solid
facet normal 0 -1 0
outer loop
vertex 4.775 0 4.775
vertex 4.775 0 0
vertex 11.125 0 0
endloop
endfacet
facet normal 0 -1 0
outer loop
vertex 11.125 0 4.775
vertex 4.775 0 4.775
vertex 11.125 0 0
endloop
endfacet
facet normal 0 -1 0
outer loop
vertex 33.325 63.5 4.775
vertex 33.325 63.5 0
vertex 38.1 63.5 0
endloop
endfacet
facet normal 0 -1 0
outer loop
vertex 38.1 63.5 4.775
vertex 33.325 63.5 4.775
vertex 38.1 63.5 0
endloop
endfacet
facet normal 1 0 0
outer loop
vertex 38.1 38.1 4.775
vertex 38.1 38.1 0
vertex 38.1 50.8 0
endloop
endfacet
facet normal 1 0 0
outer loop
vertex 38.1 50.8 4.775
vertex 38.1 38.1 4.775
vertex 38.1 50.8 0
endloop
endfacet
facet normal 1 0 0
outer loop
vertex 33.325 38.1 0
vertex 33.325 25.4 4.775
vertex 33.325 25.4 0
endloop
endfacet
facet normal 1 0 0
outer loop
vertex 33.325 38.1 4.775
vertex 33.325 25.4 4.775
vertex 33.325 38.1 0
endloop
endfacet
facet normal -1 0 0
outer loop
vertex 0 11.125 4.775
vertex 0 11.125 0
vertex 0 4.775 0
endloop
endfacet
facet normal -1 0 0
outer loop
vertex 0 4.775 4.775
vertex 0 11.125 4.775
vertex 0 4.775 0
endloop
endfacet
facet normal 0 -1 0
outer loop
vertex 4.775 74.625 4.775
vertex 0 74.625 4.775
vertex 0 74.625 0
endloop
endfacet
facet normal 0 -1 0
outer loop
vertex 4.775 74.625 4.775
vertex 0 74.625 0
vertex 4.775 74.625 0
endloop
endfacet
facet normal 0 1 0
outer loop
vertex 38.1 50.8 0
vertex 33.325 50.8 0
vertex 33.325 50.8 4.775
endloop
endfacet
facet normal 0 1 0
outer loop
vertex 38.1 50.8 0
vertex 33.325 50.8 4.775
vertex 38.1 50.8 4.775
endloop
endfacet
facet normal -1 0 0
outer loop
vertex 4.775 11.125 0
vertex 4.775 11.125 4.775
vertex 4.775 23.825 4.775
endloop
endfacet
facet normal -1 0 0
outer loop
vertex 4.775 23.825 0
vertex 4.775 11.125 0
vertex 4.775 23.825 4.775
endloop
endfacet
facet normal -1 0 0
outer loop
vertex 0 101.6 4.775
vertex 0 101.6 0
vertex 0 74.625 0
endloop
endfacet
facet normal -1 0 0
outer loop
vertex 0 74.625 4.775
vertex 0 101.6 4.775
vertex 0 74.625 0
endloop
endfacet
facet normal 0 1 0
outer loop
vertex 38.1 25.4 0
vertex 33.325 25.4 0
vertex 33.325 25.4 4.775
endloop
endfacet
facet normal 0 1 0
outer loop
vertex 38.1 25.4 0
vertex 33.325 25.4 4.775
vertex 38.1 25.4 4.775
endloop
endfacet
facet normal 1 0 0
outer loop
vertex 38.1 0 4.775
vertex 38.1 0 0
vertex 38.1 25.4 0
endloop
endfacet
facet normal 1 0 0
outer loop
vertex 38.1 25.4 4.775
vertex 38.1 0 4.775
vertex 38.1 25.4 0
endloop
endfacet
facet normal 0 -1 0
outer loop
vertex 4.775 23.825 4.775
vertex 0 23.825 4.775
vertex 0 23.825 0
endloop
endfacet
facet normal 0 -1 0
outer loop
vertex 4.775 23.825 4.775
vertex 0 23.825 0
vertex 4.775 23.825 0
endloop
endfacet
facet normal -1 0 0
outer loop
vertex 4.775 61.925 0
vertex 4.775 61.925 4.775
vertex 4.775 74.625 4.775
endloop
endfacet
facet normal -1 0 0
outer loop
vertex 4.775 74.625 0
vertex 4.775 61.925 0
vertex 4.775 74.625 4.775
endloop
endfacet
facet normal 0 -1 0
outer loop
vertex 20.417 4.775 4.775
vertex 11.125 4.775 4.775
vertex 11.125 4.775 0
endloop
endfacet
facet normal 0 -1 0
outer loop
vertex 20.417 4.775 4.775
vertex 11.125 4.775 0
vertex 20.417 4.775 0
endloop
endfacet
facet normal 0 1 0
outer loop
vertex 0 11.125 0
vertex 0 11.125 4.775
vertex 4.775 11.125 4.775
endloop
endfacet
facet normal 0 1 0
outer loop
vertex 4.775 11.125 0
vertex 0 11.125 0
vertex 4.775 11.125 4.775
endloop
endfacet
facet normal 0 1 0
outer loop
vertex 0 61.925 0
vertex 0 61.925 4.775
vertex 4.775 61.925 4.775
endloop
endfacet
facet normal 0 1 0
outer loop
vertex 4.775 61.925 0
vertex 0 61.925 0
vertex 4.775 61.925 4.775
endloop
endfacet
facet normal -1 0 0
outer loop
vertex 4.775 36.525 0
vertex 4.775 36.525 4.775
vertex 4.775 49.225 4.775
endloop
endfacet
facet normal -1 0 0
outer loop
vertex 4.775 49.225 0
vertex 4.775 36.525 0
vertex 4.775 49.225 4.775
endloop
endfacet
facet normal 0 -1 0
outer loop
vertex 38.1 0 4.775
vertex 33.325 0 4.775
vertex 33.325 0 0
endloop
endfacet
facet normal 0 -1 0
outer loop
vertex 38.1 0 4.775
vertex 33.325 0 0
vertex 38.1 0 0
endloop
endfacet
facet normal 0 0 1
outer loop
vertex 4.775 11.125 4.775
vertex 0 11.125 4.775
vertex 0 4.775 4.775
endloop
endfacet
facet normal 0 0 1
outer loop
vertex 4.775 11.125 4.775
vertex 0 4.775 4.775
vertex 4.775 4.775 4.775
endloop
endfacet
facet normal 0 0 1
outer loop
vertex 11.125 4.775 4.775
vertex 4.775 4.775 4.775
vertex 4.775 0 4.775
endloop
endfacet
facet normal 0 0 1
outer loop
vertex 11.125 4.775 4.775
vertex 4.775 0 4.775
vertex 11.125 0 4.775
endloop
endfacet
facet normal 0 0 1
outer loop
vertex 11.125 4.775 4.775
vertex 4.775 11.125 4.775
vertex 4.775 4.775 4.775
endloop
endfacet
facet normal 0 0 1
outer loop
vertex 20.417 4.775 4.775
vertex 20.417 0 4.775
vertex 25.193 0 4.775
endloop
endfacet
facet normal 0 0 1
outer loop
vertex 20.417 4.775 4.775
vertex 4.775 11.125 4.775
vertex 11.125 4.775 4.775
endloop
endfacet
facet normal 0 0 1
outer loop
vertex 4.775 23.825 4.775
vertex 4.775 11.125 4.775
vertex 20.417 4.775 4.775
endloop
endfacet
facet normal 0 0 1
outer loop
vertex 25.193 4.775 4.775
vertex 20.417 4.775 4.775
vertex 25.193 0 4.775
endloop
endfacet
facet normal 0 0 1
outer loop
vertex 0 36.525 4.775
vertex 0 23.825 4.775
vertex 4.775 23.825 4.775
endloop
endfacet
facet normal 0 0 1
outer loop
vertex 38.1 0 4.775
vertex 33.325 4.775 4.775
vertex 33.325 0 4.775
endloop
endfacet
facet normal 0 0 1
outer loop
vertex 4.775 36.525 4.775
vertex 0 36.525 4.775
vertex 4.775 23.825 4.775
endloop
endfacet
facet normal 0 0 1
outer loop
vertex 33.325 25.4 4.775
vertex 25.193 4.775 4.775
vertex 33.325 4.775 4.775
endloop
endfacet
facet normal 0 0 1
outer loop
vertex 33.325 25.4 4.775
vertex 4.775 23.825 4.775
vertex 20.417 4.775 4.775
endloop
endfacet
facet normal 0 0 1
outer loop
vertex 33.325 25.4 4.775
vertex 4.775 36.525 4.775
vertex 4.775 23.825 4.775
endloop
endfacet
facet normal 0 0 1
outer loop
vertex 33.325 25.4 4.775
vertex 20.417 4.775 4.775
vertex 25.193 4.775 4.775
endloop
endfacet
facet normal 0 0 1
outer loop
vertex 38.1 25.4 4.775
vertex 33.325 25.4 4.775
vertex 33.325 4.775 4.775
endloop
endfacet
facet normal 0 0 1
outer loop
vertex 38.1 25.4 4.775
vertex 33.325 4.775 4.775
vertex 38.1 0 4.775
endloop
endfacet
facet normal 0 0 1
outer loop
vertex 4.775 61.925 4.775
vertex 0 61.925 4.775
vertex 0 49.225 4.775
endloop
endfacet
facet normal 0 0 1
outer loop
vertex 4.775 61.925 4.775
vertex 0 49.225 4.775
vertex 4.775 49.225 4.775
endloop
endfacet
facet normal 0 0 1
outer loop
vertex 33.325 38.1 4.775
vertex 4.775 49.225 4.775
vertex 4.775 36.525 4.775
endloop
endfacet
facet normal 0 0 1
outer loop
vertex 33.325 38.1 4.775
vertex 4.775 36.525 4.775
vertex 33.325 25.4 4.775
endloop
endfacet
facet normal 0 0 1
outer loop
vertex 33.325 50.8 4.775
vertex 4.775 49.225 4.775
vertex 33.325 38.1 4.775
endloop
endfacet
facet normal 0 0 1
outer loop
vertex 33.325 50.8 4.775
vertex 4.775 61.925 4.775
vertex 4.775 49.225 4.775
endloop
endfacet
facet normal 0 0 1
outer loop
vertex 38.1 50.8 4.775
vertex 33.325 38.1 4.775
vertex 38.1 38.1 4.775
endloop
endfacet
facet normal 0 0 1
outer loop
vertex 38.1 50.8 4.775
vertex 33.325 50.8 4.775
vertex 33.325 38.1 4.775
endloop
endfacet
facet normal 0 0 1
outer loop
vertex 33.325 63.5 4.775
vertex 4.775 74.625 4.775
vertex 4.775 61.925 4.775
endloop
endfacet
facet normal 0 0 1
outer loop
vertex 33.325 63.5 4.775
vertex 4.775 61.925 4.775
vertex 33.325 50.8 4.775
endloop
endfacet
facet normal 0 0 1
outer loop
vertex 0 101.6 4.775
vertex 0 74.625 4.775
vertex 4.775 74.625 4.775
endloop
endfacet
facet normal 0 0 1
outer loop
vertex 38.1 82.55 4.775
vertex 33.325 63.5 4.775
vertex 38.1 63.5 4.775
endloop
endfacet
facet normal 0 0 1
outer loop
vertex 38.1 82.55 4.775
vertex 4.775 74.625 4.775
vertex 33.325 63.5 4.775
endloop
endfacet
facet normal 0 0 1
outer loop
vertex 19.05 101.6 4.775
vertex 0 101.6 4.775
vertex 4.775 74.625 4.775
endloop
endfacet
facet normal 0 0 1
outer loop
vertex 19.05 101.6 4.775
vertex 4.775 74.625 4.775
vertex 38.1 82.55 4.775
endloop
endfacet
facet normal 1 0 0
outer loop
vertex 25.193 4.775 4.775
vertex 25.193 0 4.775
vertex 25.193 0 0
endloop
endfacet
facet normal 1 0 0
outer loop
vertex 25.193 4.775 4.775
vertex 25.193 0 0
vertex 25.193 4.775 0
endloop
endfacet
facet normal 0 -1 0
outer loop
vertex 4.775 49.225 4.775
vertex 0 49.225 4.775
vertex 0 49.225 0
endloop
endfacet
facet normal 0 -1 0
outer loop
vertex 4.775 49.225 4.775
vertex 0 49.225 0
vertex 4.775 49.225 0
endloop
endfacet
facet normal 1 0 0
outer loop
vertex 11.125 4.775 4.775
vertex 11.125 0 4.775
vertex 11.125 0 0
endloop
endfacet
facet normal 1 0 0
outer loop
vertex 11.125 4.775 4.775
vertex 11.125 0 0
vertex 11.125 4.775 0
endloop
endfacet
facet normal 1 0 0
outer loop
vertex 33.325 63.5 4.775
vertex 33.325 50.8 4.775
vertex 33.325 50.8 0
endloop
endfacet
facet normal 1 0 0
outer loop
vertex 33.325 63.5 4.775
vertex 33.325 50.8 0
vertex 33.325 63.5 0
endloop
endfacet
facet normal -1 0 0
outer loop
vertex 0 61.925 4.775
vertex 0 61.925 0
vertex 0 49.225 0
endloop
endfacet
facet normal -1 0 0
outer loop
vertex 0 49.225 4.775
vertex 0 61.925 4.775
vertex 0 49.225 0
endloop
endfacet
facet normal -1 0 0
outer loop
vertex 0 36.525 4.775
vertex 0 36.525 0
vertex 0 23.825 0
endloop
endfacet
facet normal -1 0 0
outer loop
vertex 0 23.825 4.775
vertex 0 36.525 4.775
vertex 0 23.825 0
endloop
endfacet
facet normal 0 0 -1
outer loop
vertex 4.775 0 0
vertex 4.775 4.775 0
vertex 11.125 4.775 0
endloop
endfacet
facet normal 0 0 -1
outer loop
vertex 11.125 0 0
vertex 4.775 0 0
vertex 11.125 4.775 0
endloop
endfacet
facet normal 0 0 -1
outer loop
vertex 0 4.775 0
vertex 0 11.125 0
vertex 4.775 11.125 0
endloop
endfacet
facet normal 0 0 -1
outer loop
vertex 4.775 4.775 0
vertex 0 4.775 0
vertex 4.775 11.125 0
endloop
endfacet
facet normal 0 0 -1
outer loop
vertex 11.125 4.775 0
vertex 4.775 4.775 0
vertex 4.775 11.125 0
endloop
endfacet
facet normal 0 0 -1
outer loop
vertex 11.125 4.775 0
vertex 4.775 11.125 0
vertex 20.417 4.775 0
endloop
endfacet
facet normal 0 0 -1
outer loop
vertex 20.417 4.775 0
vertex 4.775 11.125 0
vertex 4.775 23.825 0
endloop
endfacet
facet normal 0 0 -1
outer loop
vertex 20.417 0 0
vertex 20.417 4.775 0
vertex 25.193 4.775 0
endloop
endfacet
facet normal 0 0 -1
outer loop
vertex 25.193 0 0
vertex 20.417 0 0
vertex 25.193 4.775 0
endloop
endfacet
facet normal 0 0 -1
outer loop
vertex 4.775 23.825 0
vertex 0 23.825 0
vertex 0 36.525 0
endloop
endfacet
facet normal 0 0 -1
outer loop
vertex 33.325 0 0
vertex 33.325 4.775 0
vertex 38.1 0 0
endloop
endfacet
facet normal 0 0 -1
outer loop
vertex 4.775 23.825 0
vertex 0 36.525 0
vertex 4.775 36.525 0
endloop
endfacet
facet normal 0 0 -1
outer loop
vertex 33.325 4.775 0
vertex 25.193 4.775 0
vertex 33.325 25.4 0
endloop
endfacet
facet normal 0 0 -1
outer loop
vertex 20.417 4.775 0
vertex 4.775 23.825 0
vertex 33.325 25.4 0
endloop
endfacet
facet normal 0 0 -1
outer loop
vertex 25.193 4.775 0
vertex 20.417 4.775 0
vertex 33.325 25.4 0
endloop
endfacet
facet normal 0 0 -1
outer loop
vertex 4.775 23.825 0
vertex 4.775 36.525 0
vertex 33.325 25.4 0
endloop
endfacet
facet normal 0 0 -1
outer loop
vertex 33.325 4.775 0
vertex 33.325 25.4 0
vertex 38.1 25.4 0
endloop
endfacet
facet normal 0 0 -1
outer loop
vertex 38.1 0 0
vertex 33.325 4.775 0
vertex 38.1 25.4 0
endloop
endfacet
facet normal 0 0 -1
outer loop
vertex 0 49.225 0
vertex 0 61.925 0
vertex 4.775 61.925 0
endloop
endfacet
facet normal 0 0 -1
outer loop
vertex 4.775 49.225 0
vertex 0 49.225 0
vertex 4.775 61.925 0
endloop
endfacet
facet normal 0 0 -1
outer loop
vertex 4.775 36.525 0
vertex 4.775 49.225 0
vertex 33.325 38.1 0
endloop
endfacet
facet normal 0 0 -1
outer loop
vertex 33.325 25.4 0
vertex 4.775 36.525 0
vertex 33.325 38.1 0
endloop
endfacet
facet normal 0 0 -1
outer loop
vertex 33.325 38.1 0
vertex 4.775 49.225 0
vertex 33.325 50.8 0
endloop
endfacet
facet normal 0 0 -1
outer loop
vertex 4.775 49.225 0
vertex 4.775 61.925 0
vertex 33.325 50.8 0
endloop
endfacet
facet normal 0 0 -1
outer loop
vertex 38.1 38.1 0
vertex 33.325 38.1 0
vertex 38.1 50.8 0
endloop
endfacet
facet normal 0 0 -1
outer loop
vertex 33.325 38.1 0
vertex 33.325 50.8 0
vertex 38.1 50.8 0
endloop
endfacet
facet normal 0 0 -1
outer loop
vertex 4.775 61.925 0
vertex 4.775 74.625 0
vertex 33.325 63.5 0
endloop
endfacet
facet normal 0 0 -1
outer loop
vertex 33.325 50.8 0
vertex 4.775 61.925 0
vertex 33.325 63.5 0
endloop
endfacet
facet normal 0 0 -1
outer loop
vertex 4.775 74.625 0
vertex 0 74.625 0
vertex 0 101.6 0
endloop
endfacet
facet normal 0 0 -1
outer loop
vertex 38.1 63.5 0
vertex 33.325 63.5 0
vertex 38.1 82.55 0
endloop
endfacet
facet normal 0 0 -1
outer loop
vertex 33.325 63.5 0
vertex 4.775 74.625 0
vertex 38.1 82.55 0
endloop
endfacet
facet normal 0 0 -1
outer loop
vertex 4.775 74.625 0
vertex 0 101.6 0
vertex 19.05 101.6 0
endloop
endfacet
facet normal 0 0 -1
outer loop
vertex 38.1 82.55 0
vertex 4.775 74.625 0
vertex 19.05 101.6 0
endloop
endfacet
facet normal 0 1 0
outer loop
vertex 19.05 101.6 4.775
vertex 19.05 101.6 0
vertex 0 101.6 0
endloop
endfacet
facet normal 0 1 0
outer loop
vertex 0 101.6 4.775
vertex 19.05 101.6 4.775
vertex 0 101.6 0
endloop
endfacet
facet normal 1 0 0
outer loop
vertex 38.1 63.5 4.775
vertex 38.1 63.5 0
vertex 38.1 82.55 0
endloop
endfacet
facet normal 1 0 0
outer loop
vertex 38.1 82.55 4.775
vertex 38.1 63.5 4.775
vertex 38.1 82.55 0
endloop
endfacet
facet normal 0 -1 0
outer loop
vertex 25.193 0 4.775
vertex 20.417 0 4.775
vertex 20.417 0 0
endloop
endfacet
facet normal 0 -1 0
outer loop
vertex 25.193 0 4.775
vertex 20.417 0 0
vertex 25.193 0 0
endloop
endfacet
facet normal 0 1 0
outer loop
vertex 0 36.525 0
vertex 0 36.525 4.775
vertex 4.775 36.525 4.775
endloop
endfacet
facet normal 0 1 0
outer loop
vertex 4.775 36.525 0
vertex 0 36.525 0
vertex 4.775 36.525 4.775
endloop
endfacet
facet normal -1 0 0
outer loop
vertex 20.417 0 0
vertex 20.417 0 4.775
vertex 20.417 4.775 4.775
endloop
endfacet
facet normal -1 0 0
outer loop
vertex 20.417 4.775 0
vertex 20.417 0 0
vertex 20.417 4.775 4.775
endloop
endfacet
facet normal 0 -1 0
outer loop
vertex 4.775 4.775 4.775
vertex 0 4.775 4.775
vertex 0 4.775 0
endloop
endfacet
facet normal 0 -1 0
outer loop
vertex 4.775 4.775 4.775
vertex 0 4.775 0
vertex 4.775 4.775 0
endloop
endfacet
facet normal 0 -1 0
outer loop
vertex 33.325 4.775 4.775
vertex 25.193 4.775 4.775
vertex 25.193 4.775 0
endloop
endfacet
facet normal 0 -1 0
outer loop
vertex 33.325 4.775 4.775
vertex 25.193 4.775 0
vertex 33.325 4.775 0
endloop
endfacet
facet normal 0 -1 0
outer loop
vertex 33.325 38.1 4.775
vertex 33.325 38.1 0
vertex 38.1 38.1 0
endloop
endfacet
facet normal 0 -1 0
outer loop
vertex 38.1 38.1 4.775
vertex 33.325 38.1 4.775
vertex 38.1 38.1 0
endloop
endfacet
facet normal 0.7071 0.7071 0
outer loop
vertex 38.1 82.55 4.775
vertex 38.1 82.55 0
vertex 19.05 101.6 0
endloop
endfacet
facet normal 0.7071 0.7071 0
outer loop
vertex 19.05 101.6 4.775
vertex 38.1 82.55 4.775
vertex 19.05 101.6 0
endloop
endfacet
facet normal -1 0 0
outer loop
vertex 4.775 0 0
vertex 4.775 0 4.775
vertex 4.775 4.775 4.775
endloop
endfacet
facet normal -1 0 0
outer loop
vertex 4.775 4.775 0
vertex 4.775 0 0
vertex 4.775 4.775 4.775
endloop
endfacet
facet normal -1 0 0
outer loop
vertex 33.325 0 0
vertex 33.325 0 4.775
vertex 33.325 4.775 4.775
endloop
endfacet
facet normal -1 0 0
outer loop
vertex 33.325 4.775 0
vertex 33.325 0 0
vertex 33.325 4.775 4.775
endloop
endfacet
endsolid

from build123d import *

# Parameters (mm, degrees)
BOSS_EXTRUDE1_DEPTH = 4.7752
SKETCH3_W           = 4.7752
SKETCH3_H           = 4.7752
SKETCH3_W_2         = 9.292163612
SKETCH3_W_3         = 8.132236388
CUT_EXTRUDE2_DEPTH  = 6.35
SKETCH6_W           = 4.7752
SKETCH6_H           = 12.7
CUT_EXTRUDE3_DEPTH  = 6.35


with BuildPart() as part:
    # Sketch2 → Boss-Extrude1 (new body)
    with BuildSketch(Plane.XY):
        Polygon((0, 0), (38.1, 0), (38.1, 82.55), (19.05, 101.6), (0, 101.6), align=None)
    extrude(amount=BOSS_EXTRUDE1_DEPTH)

    # Sketch3 → Cut-Extrude2 (cut)
    with BuildSketch(Plane.XY.offset(4.7752)):
        with Locations((2.3876, 2.3876)):
            Rectangle(SKETCH3_W, SKETCH3_H)
        with Locations((15.771281806, 2.3876)):
            Rectangle(SKETCH3_W_2, SKETCH3_H)
        with Locations((29.258681806, 2.3876)):
            Rectangle(SKETCH3_W_3, SKETCH3_H)
    extrude(amount=-CUT_EXTRUDE2_DEPTH, mode=Mode.SUBTRACT)

    # Sketch6 → Cut-Extrude3 (cut)
    with BuildSketch(Plane.XY.offset(4.7752)):
        with Locations((2.3876, 17.4752)):
            Rectangle(SKETCH6_W, SKETCH6_H)
        with Locations((2.3876, 42.8752)):
            Rectangle(SKETCH6_W, SKETCH6_H)
        with Locations((2.3876, 68.2752)):
            Rectangle(SKETCH6_W, SKETCH6_H)
        with Locations((35.7124, 57.15)):
            Rectangle(SKETCH6_W, SKETCH6_H)
        with Locations((35.7124, 31.75)):
            Rectangle(SKETCH6_W, SKETCH6_H)
    extrude(amount=-CUT_EXTRUDE3_DEPTH, mode=Mode.SUBTRACT)


solid = part.part
